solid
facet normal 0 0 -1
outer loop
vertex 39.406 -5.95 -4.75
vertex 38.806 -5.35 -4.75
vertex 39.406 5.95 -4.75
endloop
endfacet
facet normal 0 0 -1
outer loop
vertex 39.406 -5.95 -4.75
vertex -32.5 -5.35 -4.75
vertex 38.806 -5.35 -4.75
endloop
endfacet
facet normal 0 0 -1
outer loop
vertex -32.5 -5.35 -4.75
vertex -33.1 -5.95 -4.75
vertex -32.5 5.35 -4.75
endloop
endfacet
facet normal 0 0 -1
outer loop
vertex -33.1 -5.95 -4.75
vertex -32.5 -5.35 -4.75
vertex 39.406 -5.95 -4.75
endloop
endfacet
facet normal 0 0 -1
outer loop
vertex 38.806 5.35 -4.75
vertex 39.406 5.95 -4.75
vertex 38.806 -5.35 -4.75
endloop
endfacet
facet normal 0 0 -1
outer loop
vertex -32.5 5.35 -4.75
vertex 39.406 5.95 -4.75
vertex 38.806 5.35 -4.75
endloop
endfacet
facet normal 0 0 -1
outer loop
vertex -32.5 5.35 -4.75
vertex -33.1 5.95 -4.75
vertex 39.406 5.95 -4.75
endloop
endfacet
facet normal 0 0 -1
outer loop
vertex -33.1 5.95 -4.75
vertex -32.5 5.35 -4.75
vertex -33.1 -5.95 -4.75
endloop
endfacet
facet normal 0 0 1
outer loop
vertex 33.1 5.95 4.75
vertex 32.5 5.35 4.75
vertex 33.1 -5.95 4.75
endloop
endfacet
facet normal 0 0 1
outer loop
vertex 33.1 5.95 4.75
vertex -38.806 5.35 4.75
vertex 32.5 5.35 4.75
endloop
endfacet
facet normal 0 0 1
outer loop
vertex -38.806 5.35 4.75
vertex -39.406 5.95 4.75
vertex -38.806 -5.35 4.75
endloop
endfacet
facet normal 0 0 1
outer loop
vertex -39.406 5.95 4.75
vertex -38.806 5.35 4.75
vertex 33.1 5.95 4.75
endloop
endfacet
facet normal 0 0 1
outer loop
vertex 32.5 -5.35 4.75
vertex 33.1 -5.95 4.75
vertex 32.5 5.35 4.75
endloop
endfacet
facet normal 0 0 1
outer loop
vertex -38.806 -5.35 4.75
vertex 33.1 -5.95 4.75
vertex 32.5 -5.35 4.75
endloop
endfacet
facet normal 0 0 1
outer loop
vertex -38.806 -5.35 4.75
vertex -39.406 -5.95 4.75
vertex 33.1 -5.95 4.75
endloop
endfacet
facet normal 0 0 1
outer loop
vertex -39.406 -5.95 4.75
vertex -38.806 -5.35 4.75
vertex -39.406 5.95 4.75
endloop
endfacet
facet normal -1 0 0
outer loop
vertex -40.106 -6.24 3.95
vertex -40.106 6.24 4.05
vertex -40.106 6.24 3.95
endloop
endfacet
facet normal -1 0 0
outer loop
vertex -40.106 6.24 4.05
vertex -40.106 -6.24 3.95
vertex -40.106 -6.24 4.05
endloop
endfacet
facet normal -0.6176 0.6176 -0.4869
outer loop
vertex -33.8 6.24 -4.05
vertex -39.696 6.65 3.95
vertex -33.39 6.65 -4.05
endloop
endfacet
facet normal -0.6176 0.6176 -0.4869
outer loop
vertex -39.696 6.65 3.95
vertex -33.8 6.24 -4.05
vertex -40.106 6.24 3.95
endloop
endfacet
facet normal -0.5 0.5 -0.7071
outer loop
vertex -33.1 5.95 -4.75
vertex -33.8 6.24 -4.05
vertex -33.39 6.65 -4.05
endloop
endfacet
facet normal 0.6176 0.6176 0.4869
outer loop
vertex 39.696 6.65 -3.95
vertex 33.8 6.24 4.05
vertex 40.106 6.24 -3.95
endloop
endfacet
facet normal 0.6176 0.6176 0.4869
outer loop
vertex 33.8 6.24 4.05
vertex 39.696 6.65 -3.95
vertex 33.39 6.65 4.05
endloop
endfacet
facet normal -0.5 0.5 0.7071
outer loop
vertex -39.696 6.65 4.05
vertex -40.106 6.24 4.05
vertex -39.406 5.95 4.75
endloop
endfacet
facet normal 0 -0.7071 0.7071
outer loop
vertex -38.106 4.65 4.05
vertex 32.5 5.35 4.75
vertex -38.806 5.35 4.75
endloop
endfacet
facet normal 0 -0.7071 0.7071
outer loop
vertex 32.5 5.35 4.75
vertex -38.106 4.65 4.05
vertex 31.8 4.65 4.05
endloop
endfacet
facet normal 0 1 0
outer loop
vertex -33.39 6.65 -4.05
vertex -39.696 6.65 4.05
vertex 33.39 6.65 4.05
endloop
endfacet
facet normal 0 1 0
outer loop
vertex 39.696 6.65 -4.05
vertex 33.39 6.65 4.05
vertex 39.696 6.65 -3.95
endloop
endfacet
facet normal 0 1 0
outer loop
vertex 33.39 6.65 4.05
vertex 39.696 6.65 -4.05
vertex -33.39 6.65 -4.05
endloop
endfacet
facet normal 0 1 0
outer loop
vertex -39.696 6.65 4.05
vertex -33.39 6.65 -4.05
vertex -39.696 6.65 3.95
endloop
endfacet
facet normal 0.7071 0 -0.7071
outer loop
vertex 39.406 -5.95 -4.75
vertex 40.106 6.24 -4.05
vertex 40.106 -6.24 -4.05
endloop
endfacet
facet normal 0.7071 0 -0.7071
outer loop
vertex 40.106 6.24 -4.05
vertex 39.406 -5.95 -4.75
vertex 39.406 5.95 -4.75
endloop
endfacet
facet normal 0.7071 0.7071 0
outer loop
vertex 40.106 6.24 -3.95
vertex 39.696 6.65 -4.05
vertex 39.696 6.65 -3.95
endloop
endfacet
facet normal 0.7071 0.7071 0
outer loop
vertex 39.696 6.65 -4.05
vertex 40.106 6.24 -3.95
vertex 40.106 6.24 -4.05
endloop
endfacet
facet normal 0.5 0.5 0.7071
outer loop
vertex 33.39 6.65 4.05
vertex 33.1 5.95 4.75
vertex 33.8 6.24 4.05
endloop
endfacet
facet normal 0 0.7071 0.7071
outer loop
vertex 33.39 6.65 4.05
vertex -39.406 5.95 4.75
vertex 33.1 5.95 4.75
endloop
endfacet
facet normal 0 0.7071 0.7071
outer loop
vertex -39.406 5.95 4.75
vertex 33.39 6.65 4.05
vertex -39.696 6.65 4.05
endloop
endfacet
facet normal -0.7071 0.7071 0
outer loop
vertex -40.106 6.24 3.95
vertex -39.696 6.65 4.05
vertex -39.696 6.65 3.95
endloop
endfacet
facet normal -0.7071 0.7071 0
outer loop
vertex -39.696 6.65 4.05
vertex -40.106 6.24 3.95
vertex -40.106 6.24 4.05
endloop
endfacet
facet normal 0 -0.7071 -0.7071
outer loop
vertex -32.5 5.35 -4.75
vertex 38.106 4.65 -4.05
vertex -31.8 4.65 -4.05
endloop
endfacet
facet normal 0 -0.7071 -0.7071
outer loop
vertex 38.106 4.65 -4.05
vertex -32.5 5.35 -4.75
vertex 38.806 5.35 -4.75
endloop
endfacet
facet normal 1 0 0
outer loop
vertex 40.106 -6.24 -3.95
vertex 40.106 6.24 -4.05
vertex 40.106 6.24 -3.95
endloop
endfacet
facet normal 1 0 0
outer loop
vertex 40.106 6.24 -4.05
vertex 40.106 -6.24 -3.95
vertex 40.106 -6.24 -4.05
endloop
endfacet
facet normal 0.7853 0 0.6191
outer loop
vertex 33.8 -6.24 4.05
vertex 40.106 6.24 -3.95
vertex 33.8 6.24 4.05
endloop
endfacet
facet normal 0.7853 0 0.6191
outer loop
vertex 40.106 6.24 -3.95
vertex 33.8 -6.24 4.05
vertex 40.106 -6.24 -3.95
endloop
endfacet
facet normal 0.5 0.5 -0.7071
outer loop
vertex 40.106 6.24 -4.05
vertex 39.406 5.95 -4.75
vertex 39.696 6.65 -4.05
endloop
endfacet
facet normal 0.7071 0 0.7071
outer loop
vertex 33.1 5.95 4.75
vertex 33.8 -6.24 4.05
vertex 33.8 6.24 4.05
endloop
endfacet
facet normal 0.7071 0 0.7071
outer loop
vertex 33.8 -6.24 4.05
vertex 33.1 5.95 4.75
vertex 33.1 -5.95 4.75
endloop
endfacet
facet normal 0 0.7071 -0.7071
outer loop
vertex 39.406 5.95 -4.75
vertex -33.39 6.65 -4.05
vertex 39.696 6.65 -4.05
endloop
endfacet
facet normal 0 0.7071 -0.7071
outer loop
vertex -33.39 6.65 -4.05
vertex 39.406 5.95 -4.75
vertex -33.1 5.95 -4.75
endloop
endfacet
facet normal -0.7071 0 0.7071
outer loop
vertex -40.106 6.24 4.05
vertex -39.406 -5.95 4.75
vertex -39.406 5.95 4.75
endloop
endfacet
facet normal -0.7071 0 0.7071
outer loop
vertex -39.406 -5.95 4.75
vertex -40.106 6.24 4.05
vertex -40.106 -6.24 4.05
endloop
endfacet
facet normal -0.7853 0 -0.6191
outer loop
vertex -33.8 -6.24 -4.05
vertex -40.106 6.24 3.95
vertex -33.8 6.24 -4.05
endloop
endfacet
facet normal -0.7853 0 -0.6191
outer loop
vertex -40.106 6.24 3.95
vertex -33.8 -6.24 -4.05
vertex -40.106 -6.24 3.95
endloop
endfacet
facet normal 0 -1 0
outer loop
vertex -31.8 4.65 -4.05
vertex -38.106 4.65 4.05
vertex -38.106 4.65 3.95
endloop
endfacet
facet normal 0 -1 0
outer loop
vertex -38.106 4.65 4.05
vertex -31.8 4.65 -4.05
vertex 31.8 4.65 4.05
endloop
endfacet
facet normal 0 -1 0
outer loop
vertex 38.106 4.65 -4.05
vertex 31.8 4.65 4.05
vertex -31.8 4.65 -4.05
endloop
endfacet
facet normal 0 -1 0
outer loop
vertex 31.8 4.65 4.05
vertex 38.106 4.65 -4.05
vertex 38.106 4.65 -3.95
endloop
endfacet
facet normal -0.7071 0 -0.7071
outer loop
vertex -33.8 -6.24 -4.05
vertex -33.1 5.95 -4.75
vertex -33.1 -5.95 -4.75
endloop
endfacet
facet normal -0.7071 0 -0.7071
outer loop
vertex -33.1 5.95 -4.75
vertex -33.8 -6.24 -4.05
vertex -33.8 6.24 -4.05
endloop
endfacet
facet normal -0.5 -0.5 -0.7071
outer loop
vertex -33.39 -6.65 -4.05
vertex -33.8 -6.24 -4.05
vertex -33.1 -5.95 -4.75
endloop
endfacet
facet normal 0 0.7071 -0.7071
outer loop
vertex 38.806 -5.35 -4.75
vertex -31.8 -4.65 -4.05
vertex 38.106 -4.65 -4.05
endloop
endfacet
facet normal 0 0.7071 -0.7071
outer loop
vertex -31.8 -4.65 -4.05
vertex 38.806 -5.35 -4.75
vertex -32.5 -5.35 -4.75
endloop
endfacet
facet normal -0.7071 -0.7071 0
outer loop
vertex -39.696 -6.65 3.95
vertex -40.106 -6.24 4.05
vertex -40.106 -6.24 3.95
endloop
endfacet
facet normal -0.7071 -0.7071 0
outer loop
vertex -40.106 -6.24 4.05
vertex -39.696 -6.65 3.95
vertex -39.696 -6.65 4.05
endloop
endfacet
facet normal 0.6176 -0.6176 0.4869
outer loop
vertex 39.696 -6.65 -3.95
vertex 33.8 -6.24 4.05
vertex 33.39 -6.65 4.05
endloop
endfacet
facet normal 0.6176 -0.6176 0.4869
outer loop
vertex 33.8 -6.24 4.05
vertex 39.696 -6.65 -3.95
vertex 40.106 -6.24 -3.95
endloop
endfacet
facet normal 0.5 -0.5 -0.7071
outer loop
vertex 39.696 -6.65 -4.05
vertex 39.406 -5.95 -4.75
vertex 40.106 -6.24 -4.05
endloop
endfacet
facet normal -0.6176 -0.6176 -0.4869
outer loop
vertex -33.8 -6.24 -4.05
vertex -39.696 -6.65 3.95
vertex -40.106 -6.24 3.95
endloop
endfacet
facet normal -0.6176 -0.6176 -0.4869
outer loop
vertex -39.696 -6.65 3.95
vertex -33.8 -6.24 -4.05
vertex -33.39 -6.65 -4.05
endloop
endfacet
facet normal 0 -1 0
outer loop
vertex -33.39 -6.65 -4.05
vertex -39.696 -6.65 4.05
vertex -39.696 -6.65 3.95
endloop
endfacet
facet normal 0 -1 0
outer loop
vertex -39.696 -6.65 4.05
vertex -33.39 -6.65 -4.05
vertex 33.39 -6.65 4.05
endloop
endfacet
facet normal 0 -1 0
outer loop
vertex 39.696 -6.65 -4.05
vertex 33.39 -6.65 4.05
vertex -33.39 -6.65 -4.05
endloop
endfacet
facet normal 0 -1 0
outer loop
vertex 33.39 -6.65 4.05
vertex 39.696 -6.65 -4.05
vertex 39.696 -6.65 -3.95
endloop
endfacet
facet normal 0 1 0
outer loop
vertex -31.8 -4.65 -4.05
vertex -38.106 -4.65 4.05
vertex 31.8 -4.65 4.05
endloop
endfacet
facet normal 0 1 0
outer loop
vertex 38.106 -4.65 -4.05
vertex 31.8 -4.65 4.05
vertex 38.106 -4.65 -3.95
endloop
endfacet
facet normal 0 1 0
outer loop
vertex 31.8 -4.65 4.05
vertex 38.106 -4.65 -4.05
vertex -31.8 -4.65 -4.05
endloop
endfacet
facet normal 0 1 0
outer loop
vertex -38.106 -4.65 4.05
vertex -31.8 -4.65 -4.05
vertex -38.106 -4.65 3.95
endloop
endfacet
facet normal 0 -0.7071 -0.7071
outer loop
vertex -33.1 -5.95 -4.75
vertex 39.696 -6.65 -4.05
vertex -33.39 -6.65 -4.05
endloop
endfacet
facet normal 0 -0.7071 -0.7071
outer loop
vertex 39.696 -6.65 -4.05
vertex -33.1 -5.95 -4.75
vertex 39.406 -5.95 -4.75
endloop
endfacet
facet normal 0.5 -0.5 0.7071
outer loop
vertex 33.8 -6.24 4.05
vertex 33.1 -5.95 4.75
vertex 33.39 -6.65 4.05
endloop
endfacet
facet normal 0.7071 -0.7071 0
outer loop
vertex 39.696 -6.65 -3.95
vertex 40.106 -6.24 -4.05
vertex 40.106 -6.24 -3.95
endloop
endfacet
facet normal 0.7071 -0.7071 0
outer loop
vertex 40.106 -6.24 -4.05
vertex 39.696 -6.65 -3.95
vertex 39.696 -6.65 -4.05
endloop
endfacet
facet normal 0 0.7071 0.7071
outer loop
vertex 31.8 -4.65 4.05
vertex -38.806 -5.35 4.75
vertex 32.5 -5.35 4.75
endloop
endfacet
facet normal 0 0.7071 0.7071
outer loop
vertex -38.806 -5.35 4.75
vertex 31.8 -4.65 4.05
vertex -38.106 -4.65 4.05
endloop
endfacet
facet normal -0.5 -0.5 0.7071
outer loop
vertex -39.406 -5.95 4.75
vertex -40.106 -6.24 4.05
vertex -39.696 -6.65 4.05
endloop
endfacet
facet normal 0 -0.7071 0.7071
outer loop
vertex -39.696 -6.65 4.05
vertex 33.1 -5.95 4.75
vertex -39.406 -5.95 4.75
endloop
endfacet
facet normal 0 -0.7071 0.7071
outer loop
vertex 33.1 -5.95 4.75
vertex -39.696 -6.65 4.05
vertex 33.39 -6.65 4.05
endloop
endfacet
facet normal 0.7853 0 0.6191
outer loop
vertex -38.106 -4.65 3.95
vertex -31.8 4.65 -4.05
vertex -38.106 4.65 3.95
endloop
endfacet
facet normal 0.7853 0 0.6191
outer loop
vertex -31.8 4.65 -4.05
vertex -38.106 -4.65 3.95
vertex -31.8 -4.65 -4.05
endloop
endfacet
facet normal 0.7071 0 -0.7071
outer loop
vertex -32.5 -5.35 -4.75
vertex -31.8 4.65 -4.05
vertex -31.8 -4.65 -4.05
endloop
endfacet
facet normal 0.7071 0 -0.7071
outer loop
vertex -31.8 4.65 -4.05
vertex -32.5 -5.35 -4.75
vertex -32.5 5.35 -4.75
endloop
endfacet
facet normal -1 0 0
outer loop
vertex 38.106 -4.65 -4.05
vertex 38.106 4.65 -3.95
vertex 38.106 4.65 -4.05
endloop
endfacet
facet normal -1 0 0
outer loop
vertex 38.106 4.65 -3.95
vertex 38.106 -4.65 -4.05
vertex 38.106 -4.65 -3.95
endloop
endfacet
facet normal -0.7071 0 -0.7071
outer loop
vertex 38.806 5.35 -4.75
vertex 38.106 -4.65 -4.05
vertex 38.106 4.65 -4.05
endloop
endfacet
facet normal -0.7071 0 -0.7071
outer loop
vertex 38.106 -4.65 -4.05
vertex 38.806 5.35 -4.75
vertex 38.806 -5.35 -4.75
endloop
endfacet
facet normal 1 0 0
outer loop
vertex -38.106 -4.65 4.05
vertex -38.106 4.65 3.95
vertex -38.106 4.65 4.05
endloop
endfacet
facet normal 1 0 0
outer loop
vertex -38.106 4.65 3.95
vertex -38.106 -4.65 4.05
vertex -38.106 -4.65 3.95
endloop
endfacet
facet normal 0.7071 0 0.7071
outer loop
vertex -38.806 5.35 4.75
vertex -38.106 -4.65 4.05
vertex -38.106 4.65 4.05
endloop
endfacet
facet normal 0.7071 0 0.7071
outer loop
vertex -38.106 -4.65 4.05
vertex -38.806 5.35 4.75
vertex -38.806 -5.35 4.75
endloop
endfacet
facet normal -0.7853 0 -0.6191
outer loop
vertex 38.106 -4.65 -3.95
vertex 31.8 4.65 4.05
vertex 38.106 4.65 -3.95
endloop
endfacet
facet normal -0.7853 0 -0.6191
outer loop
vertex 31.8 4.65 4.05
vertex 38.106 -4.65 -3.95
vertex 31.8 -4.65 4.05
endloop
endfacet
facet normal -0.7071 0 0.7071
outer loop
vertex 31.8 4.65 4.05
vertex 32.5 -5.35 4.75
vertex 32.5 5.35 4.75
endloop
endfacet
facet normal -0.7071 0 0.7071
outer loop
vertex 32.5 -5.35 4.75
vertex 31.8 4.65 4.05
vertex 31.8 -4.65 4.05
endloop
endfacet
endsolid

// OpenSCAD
// [FL_INDEX: keywords="openscad, 3d_parametric, Micro_Wallet, csg_solid" | COT="Parametric OpenSCAD design from 3DCodeverse"]
// Title: Micro Wallet

// Title: Micro Wallet
// Author: http://www.thingiverse.com/Jinja
// Date: 14/9/2013

/////////// START OF PARAMETERS /////////////////

// The more cards you carry, the bigger this should be. This is the only thing you really need to change.
inner_thickness = 10;

// Percentage to increase wall thickness
increase_wall = 0; // [0:100]

// The inner width. This is the width of the clip in the unlocked position.
inner_width = 65; // [60:80]

// The height of the wallet
height = 8; //[6:30]

// The width of your credit cards. You only need to change this if you plan to use the holder for something other than credit cards.
card_width = 56;

/////////// END OF PARAMETERS /////////////////
rounded = 0.7*1;
overhang=45*1;

$fs=0.3*1;
//$fa=5*1; //smooth
$fa=8*1; //nearly smooth
//$fa=20*1; //rough

x = inner_width*1;
y = height*1;
r = sqrt((x*x)+(y*y));
cc = card_width*1;
a = asin(cc/r);
b = acos(x/r);
c = (a-b);
new_length = cc/sin(c);
additional = new_length-x;

wall_thickness2 = 2 * (1+(increase_wall/100));
wall_thickness = wall_thickness2-(2*rounded);
height2 = height-wall_thickness2;

minkowski()
{
difference()
{
	wedge( additional+new_length+2*wall_thickness, new_length+2*wall_thickness, (inner_thickness+rounded)+2*wall_thickness, height );

	wedge( additional+new_length, new_length, (inner_thickness+rounded), height );
}

diamond(rounded);
}

module wedge( length, length2, thickness, height )
{
	hull()
	{
		translate([(-length+length2)*0.5,0,height*0.5])
		cube( [length2, thickness, 0.1], true );

		translate([(length-length2)*0.5,0,-height*0.5])
		cube( [length2, thickness, 0.1], true );
	}
}



module bar( length, diam1, diam2, height )
{
	hull()
	{
		translate( [-length*0.5, 0, -height*0.5] )
		cylinder( height, diam1*0.5, diam2*0.5 );
		translate( [length*0.5, 0, -height*0.5] )
		cylinder( height, diam1*0.5, diam2*0.5 );
	}
}

module cutter(dist, overhang)
{
	size = dist*2;

	translate([dist,-dist,-dist])
	cube([size,size,size]);

	translate([-dist-size,-dist,-dist])
	cube([size,size,size]);

	translate([dist,-dist,0])
	rotate([0,-overhang,0])
	cube([size,size,size]);

	translate([-dist,-dist,0])
	rotate([0,-90+overhang,0])
	cube([size,size,size]);

	translate([dist,-dist,0])
	rotate([0,90+overhang,0])
	cube([size,size,size]);

	translate([-dist,-dist,0])
	rotate([0,180-overhang,0])
	cube([size,size,size]);

}

module diamond( rounded )
{
	dist = rounded;
	difference()
	{
		cube([2*rounded,2*rounded,2*rounded], true);
		for(i=[0:45:179])
		{
			rotate([0,0,i])
			cutter(dist, overhang);
		}
	}
}
